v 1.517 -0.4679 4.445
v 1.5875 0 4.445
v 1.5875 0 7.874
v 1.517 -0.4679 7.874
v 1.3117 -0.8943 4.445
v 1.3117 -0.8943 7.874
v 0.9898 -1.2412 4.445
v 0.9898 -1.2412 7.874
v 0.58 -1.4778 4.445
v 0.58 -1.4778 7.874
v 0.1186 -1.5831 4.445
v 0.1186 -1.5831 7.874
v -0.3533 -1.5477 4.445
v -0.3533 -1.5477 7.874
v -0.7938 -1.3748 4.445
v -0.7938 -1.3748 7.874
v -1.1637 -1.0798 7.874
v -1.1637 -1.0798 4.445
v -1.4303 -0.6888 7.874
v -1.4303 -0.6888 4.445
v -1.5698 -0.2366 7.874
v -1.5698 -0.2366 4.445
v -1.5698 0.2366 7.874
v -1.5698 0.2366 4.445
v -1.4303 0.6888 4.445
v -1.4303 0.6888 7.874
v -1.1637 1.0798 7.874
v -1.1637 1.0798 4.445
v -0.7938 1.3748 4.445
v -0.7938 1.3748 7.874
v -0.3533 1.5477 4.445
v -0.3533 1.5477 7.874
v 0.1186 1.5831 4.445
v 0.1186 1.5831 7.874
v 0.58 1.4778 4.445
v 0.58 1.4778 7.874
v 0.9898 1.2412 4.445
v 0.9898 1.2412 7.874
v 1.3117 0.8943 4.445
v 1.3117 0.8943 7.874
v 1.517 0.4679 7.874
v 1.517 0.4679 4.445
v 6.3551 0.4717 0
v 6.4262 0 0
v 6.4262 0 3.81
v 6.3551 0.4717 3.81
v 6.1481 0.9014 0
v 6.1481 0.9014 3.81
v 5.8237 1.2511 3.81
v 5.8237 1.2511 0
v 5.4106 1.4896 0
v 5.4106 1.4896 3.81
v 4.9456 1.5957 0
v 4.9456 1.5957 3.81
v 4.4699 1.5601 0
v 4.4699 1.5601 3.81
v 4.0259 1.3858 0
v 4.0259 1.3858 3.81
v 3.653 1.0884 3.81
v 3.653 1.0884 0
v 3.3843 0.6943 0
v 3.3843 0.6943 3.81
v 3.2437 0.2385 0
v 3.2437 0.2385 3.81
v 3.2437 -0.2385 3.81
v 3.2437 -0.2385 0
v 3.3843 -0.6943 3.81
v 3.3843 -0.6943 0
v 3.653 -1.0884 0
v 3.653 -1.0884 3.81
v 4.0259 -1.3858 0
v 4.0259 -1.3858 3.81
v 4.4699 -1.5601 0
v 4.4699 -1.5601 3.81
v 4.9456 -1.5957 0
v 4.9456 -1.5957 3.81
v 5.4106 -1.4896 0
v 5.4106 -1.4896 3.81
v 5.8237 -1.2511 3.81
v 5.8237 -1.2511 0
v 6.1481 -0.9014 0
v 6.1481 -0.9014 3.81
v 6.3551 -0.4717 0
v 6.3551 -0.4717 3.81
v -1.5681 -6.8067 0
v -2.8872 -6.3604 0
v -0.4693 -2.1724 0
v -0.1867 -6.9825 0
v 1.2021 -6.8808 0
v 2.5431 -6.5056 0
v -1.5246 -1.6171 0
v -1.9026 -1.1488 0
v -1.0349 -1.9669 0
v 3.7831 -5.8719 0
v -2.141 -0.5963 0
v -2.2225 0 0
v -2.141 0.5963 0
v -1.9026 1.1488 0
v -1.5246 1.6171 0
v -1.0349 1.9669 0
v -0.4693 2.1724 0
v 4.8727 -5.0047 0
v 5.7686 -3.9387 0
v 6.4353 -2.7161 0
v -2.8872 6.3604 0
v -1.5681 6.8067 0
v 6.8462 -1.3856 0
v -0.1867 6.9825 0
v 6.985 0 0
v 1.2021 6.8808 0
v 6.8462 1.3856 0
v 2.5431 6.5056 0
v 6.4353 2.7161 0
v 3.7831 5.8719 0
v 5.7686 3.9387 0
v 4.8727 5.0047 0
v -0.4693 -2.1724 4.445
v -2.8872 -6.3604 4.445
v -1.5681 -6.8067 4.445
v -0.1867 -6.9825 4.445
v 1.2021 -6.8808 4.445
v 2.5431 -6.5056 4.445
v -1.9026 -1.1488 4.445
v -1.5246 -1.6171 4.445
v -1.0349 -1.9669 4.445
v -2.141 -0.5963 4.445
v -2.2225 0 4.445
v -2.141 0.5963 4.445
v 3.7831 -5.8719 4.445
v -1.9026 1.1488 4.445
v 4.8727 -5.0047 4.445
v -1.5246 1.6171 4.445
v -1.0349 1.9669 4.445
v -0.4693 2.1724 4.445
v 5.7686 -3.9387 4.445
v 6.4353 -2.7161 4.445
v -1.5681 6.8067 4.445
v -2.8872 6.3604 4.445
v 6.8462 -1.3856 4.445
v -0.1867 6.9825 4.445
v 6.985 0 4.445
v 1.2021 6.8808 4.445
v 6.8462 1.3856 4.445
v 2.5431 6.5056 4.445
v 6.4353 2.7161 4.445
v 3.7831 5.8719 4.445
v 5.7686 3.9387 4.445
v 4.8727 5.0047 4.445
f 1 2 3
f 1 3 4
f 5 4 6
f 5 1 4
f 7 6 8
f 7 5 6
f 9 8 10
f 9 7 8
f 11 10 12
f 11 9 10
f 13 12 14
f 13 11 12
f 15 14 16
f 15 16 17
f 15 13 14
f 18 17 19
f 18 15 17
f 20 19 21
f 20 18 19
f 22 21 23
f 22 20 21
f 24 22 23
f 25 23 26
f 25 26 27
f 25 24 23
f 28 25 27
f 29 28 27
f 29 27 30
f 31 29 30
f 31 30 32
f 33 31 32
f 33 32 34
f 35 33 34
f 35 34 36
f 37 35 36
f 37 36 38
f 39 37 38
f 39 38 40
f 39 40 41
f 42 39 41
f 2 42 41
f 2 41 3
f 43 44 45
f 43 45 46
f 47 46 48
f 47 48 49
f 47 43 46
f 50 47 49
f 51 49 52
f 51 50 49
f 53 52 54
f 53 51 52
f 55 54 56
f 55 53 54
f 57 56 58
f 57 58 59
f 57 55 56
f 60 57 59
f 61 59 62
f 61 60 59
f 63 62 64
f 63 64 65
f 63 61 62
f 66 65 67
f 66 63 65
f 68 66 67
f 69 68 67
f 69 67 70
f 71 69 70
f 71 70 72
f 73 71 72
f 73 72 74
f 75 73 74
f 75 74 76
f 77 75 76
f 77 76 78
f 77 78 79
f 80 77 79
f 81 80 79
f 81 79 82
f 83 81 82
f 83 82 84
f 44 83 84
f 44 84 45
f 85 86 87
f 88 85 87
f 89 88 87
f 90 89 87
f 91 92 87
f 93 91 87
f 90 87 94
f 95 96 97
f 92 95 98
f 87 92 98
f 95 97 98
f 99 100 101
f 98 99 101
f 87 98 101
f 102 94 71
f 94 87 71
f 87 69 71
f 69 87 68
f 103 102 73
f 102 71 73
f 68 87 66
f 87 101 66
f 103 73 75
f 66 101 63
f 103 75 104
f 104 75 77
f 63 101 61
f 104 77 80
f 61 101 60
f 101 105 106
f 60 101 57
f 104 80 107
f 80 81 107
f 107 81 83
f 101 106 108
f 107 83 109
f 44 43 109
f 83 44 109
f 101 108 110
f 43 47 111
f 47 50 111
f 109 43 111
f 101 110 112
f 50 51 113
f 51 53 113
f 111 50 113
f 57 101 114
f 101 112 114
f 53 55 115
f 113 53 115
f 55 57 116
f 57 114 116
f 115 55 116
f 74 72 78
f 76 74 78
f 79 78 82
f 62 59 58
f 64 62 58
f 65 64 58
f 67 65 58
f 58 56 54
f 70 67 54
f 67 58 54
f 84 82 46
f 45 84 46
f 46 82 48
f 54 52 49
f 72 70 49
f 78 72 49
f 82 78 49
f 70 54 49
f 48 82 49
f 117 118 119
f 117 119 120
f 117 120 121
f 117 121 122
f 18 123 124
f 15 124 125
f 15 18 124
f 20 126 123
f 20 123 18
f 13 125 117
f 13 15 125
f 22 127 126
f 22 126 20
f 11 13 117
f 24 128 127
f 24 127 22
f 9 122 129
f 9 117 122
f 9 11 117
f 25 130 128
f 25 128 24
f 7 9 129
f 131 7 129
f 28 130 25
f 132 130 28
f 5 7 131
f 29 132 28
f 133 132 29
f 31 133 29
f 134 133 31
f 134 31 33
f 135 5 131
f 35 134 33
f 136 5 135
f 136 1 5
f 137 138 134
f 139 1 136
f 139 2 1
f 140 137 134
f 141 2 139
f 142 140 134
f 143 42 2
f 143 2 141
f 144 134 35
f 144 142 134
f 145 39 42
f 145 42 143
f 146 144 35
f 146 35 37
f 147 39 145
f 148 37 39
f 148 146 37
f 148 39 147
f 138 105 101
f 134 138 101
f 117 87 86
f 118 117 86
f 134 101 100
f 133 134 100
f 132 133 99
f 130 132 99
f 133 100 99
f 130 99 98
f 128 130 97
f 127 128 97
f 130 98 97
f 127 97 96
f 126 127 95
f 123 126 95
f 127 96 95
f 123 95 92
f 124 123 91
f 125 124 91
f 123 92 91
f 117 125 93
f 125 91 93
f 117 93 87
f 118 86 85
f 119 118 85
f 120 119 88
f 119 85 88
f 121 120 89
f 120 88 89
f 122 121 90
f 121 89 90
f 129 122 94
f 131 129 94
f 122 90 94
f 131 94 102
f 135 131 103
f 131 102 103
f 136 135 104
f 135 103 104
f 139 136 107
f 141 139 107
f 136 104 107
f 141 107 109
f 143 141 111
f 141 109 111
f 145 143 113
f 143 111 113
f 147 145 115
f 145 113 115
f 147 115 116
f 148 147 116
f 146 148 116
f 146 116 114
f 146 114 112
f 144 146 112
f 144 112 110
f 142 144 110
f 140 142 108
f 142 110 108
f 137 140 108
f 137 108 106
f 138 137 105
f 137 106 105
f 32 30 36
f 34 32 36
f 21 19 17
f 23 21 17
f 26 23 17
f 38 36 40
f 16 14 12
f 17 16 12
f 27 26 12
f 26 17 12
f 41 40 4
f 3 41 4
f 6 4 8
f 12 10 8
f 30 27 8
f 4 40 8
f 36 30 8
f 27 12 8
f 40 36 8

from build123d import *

# Parameters (mm, degrees)
F0_R     = 1.5875
F0_R_2   = 1.6002
F1_DEPTH = 4.445
F2_R     = 1.5875
F3_DEPTH = 7.874
F4_R     = 1.6002
F5_DEPTH = 0.635


with BuildPart() as f1:
    # F0 (on Top) → F1 (new body)
    with BuildSketch(Plane.XY):
        with BuildLine():
            Line((-0.469262, -2.172395), (-2.887193, -6.360373))
            ThreePointArc((-2.887193, -6.360373), (6.985, 0), (-2.887193, 6.360373))
            Line((-2.887193, 6.360373), (-0.469262, 2.172395))
            ThreePointArc((-0.469262, 2.172395), (-2.2225, 0), (-0.469262, -2.172395))
        make_face()
        Circle(F0_R, mode=Mode.SUBTRACT)
        with Locations((4.826, 0)):
            Circle(F0_R_2, mode=Mode.SUBTRACT)
    extrude(amount=F1_DEPTH)

    # F2 (on face) → F3 (join)
    with BuildSketch(Plane(origin=(0, 0, 0), x_dir=(1, 0, 0), z_dir=(0, 0, -1))):
        Circle(F2_R)
    extrude(amount=-F3_DEPTH)

    # F4 (on face) → F5 (join)
    with BuildSketch(Plane.XY.offset(4.445)):
        with Locations((4.826, 0)):
            Circle(F4_R)
    extrude(amount=-F5_DEPTH)


solid = f1.part
